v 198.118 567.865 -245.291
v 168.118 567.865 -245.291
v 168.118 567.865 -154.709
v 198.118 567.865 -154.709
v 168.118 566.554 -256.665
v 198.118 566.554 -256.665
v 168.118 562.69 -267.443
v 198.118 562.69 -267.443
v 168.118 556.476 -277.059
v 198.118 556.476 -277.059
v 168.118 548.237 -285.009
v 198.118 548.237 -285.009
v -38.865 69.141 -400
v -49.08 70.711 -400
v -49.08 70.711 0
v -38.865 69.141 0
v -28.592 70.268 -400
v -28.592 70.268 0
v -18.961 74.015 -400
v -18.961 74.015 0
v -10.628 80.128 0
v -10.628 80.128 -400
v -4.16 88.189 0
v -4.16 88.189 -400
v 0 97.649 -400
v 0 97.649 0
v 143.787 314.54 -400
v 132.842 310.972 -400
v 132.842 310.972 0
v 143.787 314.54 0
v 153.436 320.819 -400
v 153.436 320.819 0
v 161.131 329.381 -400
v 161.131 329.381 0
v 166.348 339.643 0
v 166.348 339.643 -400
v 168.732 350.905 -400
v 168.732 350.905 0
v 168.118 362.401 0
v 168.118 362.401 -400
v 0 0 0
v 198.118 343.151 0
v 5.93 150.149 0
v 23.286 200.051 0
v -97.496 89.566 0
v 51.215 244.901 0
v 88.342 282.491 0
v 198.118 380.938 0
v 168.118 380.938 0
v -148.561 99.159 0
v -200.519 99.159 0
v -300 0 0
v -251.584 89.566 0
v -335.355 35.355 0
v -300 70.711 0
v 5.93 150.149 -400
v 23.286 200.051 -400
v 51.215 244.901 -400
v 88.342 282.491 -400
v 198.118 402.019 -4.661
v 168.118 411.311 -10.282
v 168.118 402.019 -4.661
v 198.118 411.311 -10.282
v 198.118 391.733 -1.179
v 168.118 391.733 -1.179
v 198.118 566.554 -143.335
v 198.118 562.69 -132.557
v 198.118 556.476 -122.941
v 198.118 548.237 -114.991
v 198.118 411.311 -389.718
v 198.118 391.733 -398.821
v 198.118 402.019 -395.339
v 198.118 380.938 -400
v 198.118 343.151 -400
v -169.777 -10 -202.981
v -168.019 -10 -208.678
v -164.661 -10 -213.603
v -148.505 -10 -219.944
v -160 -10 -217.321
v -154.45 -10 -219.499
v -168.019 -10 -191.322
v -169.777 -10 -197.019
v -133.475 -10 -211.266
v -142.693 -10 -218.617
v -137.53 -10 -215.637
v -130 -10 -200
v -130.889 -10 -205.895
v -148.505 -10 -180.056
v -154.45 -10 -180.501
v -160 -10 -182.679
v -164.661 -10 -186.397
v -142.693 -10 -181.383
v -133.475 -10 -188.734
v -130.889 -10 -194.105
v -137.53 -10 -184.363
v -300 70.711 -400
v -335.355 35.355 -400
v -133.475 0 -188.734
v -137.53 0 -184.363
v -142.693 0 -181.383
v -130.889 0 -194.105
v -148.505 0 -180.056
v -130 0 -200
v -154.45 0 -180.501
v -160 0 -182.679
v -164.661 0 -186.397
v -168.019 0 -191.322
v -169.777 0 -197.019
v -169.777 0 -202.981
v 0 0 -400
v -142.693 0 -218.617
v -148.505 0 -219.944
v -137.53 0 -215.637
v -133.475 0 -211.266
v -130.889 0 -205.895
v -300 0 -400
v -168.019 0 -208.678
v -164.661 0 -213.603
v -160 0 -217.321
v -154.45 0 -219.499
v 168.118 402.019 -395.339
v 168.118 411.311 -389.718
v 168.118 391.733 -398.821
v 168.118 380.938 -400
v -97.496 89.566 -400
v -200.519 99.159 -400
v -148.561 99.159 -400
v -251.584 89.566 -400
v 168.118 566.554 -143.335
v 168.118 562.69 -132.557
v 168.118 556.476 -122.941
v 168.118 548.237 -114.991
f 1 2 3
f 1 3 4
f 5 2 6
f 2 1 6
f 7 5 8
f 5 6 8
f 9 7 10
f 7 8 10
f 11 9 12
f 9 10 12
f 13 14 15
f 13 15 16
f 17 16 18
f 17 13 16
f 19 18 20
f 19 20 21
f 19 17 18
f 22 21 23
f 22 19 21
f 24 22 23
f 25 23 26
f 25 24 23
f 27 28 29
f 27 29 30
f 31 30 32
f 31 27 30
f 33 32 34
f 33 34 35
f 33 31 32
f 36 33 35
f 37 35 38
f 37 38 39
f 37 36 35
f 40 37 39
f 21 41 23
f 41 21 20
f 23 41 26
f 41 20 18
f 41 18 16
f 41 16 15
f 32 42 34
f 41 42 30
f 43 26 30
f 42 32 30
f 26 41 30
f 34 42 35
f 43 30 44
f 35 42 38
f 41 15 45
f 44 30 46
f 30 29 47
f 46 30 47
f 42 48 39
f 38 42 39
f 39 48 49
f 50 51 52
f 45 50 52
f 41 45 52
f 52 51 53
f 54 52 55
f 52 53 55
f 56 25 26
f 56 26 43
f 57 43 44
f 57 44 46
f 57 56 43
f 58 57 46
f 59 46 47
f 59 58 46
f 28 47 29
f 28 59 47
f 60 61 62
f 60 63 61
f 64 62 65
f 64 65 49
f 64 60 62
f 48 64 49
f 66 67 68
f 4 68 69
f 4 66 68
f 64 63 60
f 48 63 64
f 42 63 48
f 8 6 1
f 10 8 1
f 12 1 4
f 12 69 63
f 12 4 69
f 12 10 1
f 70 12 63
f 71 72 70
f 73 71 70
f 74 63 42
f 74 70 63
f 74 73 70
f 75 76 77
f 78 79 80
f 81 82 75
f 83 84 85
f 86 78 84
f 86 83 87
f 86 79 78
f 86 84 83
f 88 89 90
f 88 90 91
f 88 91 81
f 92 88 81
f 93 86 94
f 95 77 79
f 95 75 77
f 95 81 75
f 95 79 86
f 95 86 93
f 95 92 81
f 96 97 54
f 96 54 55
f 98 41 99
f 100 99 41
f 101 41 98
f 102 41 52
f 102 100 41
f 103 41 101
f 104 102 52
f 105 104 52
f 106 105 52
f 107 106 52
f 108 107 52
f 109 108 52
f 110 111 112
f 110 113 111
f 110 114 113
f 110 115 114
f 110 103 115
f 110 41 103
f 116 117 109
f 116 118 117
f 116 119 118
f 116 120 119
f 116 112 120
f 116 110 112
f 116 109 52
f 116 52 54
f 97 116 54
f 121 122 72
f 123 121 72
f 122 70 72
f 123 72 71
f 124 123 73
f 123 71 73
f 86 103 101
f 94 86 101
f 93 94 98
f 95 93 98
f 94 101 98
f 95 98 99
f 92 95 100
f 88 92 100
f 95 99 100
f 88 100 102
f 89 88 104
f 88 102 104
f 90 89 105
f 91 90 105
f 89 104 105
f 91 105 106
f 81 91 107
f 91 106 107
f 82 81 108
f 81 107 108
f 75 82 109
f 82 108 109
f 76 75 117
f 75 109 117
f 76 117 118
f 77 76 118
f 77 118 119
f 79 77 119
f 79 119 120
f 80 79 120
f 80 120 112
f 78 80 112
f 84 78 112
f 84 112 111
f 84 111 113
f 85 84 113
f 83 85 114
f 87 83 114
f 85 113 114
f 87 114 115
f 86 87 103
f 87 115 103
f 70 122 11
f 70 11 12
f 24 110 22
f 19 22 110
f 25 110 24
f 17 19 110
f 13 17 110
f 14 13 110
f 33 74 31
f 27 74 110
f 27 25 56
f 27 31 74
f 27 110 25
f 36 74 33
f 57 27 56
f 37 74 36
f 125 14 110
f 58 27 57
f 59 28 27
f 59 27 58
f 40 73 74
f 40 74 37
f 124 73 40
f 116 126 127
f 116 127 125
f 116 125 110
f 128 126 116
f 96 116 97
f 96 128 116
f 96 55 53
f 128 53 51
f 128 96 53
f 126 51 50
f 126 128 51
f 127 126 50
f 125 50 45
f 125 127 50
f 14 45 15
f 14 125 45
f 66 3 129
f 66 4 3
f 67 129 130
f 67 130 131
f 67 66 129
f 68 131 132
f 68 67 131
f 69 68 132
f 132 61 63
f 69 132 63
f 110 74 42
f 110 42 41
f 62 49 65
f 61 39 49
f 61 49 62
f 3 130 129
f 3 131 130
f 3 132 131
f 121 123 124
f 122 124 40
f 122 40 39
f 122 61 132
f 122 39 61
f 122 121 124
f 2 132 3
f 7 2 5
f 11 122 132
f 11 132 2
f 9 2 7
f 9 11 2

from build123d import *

# Parameters (mm, degrees)
BOSS_EXTRUDE1_DEPTH = 200
CHAMFER1_SIZE       = 130
CHAMFER1_SIZE2      = 170
CHAMFER2_SIZE       = 170
CHAMFER2_SIZE2      = 130
FILLET1_R           = 50
SKETCH2_R           = 20
BOSS_EXTRUDE2_DEPTH = 10


with BuildPart() as part:
    # Sketch1 → Boss-Extrude1 (new body)
    with BuildSketch(Plane.XY):
        with BuildLine():
            Line((0, 0), (-300, 0))
            Line((-300, 0), (-335.355339059, 35.355339059))
            Line((-335.355339059, 35.355339059), (-300, 70.710678119))
            ThreePointArc((-300, 70.710678119), (-174.539840649, 100.365711492), (-49.079681299, 70.710678119))
            ThreePointArc((-49.079681299, 70.710678119), (-18.96069104, 74.015201956), (0, 97.649195424))
            ThreePointArc((0, 97.649195424), (36.003553141, 223.252657901), (132.842160393, 310.972494714))
            ThreePointArc((132.842160393, 310.972494714), (161.131495087, 329.380753651), (168.11847076, 362.400938773))
            Line((168.11847076, 362.400938773), (168.11847076, 567.864757456))
            Line((168.11847076, 567.864757456), (198.11847076, 567.864757456))
            Line((198.11847076, 567.864757456), (198.11847076, 343.151257275))
            Line((198.11847076, 343.151257275), (0, 0))
        make_face()
    extrude(amount=-BOSS_EXTRUDE1_DEPTH)

    # Mirror1: part across plane


with BuildPart() as part_1:
    add(part.part)
    add(part.part.mirror(Plane(origin=(-174.539840649, -179.851012248, -200), x_dir=(1, 0, 0), z_dir=(0, 0, -1))))

    # Chamfer1
    chamfer1_edges = [part_1.edges().sort_by_distance(p)[0] for p in [
        (183.11847076, 567.864757456, 0),
    ]]
    chamfer1_side = [part_1.faces().sort_by_distance(p)[0] for p in [
        (183.11847076, 567.864757456, -200),
    ]]
    chamfer(chamfer1_edges, length=CHAMFER1_SIZE, length2=CHAMFER1_SIZE2, reference=chamfer1_side[0])

    # Chamfer2
    chamfer2_edges = [part_1.edges().sort_by_distance(p)[0] for p in [
        (183.11847076, 567.864757456, -400),
    ]]
    chamfer2_side = [part_1.faces().sort_by_distance(p)[0] for p in [
        (190.327035151, 455.508007366, -400),
    ]]
    chamfer(chamfer2_edges, length=CHAMFER2_SIZE, length2=CHAMFER2_SIZE2, reference=chamfer2_side[0])

    # Fillet1
    fillet1_edges = [part_1.edges().sort_by_distance(p)[0] for p in [
        (183.11847076, 397.864757456, 0),
        (183.11847076, 567.864757456, -130),
        (183.11847076, 567.864757456, -270),
        (183.11847076, 397.864757456, -400),
    ]]
    fillet(fillet1_edges, radius=FILLET1_R)

    # Sketch2 → Boss-Extrude2 (add)
    with BuildSketch(Plane.XZ):
        with Locations((-150, -200)):
            Circle(SKETCH2_R)
    extrude(amount=BOSS_EXTRUDE2_DEPTH)


solid = part_1.part
